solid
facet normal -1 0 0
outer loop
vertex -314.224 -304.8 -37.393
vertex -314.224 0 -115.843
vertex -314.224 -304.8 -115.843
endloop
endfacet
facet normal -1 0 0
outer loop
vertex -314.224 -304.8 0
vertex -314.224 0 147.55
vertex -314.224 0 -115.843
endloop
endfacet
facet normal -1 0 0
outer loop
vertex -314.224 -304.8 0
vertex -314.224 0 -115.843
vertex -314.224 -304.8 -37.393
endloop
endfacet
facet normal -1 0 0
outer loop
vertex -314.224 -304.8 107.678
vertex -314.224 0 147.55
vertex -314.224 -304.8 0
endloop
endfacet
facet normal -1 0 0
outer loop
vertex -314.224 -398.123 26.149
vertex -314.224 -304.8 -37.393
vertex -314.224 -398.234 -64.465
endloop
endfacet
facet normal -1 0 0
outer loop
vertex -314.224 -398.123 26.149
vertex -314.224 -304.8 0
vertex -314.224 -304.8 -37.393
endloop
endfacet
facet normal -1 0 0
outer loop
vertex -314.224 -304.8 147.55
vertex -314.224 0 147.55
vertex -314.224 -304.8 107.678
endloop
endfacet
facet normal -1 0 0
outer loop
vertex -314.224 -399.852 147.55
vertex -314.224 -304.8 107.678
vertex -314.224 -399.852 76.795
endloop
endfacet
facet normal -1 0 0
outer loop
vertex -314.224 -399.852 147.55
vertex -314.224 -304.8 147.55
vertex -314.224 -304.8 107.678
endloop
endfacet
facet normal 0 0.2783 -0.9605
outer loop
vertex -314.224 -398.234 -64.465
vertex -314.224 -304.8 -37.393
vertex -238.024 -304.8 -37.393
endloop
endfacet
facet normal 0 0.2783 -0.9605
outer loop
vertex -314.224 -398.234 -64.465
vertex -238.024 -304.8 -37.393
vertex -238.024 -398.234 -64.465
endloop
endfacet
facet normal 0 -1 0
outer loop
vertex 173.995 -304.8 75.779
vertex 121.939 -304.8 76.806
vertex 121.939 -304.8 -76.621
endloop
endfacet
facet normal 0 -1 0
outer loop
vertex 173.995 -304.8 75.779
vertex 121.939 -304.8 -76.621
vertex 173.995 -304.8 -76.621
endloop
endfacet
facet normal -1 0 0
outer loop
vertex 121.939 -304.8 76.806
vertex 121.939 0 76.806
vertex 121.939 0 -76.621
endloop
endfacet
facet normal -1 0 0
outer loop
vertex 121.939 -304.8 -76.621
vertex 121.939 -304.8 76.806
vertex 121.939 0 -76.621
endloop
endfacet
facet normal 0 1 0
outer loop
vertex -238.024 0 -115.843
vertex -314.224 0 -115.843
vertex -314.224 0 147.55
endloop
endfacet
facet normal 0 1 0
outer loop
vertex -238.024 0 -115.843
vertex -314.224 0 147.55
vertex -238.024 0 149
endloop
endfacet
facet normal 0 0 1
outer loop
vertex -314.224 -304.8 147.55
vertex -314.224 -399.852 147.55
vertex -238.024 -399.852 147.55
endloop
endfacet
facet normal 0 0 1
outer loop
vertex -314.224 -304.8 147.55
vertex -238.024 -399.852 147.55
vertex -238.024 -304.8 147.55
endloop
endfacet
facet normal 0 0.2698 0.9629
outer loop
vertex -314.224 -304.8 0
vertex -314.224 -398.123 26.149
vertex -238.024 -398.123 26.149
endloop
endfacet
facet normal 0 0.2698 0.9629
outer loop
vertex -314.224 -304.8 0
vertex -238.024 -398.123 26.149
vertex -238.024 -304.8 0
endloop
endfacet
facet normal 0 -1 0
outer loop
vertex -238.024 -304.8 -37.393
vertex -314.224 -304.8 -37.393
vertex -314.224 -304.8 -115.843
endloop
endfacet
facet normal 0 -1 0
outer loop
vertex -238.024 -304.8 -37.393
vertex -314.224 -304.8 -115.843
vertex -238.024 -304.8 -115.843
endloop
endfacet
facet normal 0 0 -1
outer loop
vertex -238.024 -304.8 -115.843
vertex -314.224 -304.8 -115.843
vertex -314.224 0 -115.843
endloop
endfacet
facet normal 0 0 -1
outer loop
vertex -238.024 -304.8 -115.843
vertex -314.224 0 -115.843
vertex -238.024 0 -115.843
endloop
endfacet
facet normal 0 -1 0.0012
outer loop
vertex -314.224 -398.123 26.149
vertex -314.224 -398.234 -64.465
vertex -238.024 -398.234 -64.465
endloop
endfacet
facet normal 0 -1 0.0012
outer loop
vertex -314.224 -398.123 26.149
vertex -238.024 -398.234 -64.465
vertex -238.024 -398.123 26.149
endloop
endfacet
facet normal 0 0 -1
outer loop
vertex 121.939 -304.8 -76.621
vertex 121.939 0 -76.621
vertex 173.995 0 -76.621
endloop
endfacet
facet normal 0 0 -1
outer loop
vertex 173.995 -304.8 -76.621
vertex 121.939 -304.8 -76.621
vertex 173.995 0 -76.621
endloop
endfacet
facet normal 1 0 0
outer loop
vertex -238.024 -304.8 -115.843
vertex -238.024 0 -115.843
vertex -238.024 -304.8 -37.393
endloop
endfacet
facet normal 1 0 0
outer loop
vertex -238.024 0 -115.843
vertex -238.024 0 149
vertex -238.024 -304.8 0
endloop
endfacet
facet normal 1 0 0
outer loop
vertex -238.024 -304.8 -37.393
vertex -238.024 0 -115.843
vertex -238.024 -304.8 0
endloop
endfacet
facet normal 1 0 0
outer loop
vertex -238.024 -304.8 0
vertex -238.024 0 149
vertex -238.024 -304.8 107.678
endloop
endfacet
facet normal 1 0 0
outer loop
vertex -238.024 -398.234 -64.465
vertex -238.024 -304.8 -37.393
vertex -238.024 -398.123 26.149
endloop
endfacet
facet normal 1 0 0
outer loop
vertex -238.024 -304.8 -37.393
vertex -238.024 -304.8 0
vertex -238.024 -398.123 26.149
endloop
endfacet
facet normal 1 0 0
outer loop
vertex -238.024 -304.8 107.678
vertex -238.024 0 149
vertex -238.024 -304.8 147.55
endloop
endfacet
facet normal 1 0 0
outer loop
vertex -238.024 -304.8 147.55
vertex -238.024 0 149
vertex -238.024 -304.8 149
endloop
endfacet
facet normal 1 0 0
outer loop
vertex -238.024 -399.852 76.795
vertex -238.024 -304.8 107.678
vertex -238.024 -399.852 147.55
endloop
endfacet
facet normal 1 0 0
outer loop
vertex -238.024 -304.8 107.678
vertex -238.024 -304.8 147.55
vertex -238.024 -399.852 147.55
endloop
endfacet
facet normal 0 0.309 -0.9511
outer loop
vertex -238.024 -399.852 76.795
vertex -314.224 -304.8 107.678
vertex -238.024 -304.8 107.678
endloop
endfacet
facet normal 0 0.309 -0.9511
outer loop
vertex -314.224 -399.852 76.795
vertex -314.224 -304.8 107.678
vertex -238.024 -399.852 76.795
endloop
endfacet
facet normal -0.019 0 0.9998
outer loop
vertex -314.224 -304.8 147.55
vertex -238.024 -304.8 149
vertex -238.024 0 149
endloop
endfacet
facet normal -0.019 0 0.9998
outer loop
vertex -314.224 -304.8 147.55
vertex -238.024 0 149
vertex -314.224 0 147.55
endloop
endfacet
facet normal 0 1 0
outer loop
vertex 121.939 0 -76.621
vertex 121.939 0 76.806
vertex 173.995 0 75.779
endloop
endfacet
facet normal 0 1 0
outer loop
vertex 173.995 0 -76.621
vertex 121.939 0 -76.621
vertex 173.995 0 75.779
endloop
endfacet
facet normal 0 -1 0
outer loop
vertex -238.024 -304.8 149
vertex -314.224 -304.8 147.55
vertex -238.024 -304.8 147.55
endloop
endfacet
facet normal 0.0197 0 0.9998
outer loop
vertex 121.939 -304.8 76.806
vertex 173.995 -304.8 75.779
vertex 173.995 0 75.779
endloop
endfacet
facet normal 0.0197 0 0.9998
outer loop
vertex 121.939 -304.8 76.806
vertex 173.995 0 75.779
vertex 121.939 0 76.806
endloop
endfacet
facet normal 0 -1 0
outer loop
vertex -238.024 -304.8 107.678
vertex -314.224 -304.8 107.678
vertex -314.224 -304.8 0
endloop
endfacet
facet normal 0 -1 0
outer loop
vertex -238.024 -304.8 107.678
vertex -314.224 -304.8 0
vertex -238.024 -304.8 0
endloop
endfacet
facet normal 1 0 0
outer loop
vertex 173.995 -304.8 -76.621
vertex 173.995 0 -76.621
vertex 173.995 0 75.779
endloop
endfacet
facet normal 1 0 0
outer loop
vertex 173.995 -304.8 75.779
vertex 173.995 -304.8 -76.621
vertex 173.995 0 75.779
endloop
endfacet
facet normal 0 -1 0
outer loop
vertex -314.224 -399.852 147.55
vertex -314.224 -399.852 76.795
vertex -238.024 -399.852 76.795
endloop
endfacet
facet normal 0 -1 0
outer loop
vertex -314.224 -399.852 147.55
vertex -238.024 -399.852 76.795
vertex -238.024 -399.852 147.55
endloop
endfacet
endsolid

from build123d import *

# Parameters (mm, degrees)
F1_DEPTH = 304.8
F3_DEPTH = 304.8
F5_DEPTH = 76.2
F7_DEPTH = 76.2


with BuildPart() as f1:
    # F0 (on Front) → F1 (new body)
    with BuildSketch(Plane.XZ):
        Polygon((173.995058, 75.778773), (121.939329, 76.806195), (121.939329, -76.621227), (173.995058, -76.621227), align=None)
    extrude(amount=F1_DEPTH)


with BuildPart() as f3:
    # F2 (on Front) → F3 (new body)
    with BuildSketch(Plane.XZ):
        Polygon((-238.02441, 148.999748), (-314.22441, 147.550184), (-314.22441, -115.84275), (-238.02441, -115.84275), align=None)
    extrude(amount=F3_DEPTH)

    # F4 (on face) → F5 (join)
    with BuildSketch(Plane(origin=(-314.22441, 0, 0), x_dir=(0, -1, 0), z_dir=(-1, 0, 0))):
        Polygon((399.852127, 147.550184), (304.8, 147.550184), (304.8, 107.678145), (399.852127, 76.795444), align=None)
    extrude(amount=-F5_DEPTH)

    # F6 (on face) → F7 (join)
    with BuildSketch(Plane(origin=(-314.22441, 0, 0), x_dir=(0, -1, 0), z_dir=(-1, 0, 0))):
        Polygon((398.122579, 26.148599), (304.8, 0), (304.8, -37.392534), (398.233682, -64.465053), align=None)
    extrude(amount=-F7_DEPTH)


solid = Compound([f1.part, f3.part])
